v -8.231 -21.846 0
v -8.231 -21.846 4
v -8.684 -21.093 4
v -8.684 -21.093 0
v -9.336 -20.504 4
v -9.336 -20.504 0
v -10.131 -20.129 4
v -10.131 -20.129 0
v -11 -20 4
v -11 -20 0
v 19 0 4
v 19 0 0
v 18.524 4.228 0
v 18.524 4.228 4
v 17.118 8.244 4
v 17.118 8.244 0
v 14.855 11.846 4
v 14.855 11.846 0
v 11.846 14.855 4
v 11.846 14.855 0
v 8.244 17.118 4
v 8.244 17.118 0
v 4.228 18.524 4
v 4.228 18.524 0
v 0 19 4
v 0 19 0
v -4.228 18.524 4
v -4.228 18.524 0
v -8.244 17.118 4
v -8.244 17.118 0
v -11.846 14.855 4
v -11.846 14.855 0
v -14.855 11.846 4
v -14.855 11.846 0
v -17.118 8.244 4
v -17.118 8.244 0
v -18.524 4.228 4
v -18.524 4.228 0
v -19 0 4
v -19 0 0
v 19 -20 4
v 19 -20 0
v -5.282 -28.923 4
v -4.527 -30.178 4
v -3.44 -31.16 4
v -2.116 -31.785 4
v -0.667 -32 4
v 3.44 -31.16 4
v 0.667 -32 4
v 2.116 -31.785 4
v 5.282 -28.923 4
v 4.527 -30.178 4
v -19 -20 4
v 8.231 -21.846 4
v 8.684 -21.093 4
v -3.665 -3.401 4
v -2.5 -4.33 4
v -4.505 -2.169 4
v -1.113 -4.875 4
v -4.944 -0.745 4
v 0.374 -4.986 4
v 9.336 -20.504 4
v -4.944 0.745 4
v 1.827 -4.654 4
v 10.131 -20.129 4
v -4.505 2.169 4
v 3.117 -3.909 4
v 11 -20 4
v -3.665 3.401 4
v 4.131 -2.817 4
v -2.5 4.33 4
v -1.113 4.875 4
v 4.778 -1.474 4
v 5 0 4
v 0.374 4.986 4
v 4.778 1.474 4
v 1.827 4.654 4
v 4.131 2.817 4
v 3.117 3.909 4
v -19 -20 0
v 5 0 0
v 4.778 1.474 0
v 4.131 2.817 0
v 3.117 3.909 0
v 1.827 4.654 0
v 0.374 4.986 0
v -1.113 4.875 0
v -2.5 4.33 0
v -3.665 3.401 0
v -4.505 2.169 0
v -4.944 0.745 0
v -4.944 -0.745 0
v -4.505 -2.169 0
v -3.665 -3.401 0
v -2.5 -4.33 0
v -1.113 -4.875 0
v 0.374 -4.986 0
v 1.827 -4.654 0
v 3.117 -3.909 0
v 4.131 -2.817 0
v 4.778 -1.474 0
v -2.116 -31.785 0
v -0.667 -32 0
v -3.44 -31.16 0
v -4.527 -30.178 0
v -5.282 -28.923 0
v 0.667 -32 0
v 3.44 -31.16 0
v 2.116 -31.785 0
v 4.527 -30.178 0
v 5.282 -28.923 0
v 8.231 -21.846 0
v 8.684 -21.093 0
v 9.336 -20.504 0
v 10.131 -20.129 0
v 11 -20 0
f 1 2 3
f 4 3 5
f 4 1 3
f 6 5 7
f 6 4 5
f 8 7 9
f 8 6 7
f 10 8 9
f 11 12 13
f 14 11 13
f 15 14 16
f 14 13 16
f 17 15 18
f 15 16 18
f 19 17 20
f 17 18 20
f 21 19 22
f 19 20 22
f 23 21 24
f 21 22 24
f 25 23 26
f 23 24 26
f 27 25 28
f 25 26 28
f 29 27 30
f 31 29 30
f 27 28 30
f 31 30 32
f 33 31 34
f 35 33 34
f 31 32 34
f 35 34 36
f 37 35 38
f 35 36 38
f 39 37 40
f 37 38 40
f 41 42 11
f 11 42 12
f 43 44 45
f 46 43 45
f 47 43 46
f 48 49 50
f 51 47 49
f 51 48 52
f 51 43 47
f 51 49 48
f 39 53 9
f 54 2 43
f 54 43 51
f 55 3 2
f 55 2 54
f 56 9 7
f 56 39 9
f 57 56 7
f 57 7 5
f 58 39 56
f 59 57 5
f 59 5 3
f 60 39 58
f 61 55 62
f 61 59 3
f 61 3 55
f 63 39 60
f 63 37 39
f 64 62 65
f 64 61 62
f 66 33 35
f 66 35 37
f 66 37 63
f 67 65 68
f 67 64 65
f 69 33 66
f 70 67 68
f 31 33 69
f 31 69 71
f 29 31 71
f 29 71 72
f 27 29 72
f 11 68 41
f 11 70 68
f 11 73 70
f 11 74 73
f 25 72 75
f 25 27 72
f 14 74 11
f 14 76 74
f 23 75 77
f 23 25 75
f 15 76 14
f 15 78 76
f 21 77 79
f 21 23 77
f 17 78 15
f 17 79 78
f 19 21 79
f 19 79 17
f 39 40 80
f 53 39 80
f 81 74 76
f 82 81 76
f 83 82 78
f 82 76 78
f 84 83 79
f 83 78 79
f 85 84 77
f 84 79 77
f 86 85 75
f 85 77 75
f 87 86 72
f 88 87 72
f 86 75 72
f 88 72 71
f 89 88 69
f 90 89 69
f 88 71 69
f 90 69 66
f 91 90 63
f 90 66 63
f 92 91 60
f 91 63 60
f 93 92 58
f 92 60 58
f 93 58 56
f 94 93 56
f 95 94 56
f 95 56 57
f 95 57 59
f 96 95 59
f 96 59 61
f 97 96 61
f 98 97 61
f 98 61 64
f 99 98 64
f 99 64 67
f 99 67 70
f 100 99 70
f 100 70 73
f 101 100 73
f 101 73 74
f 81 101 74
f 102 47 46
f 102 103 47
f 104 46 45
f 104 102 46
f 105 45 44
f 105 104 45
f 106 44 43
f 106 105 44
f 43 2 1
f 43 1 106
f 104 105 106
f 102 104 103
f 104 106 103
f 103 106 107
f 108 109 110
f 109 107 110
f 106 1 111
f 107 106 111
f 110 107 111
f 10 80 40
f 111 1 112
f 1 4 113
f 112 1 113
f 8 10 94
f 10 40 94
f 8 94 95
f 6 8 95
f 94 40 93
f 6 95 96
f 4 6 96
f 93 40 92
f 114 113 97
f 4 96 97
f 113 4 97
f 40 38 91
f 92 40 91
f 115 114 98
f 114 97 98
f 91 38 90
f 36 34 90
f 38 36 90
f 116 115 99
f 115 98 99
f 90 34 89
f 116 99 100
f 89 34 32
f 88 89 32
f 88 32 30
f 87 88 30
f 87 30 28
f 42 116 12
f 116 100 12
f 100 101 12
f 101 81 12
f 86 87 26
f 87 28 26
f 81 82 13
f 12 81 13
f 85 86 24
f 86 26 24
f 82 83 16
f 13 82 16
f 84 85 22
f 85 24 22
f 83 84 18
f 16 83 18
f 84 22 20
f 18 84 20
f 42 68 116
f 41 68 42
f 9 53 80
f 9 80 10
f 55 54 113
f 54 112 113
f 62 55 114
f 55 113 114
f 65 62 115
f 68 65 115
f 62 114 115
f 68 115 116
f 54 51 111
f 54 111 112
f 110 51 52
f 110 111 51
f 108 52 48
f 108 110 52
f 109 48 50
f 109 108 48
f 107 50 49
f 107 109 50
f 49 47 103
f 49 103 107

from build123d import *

# Parameters (mm, degrees)
SKETCH1_R           = 2.5
SKETCH1_R_2         = 1.5
BOSS_EXTRUDE1_DEPTH = 4
SKETCH2_R           = 5
CUT_EXTRUDE1_DEPTH  = 50.010203019
FILLET1_R           = 5
FILLET2_R           = 3


with BuildPart() as part:
    # Sketch1 → Boss-Extrude1 (new body)
    with BuildSketch(Plane.XY):
        with BuildLine():
            Line((-19, 0), (-19, -32))
            Line((-19, -32), (-14.8, -32))
            Line((-14.8, -32), (-14.8, -45))
            Line((-14.8, -45), (-5, -45))
            Line((-5, -45), (-5, -42))
            Line((-5, -42), (5, -42))
            Line((5, -42), (5, -45))
            Line((5, -45), (19, -45))
            Line((19, -45), (19, 0))
            ThreePointArc((19, 0), (0, 19), (-19, 0))
        make_face()
        Circle(SKETCH1_R, mode=Mode.SUBTRACT)
        with Locations((-14, -27)):
            Circle(SKETCH1_R_2, mode=Mode.SUBTRACT)
        with Locations(Location((14, -27, 0), (0, 0, 180))):
            Circle(SKETCH1_R_2, mode=Mode.SUBTRACT)
    extrude(amount=BOSS_EXTRUDE1_DEPTH)

    # Sketch2 → Cut-Extrude1 (cut, through all)
    with BuildSketch(Plane.XY.offset(4)):
        Circle(SKETCH2_R)
        Polygon((-19, -20), (-9, -20), (-4, -32), (4, -32), (9, -20), (19, -20), (19, -45), (-19, -45), align=None)
    extrude(amount=-CUT_EXTRUDE1_DEPTH, mode=Mode.SUBTRACT)

    # Fillet1
    fillet1_edges = [part.edges().sort_by_distance(p)[0] for p in [
        (-4, -32, 2),
        (4, -32, 2),
    ]]
    fillet(fillet1_edges, radius=FILLET1_R)

    # Fillet2
    fillet2_edges = [part.edges().sort_by_distance(p)[0] for p in [
        (-9, -20, 2),
        (9, -20, 2),
    ]]
    fillet(fillet2_edges, radius=FILLET2_R)


solid = part.part
